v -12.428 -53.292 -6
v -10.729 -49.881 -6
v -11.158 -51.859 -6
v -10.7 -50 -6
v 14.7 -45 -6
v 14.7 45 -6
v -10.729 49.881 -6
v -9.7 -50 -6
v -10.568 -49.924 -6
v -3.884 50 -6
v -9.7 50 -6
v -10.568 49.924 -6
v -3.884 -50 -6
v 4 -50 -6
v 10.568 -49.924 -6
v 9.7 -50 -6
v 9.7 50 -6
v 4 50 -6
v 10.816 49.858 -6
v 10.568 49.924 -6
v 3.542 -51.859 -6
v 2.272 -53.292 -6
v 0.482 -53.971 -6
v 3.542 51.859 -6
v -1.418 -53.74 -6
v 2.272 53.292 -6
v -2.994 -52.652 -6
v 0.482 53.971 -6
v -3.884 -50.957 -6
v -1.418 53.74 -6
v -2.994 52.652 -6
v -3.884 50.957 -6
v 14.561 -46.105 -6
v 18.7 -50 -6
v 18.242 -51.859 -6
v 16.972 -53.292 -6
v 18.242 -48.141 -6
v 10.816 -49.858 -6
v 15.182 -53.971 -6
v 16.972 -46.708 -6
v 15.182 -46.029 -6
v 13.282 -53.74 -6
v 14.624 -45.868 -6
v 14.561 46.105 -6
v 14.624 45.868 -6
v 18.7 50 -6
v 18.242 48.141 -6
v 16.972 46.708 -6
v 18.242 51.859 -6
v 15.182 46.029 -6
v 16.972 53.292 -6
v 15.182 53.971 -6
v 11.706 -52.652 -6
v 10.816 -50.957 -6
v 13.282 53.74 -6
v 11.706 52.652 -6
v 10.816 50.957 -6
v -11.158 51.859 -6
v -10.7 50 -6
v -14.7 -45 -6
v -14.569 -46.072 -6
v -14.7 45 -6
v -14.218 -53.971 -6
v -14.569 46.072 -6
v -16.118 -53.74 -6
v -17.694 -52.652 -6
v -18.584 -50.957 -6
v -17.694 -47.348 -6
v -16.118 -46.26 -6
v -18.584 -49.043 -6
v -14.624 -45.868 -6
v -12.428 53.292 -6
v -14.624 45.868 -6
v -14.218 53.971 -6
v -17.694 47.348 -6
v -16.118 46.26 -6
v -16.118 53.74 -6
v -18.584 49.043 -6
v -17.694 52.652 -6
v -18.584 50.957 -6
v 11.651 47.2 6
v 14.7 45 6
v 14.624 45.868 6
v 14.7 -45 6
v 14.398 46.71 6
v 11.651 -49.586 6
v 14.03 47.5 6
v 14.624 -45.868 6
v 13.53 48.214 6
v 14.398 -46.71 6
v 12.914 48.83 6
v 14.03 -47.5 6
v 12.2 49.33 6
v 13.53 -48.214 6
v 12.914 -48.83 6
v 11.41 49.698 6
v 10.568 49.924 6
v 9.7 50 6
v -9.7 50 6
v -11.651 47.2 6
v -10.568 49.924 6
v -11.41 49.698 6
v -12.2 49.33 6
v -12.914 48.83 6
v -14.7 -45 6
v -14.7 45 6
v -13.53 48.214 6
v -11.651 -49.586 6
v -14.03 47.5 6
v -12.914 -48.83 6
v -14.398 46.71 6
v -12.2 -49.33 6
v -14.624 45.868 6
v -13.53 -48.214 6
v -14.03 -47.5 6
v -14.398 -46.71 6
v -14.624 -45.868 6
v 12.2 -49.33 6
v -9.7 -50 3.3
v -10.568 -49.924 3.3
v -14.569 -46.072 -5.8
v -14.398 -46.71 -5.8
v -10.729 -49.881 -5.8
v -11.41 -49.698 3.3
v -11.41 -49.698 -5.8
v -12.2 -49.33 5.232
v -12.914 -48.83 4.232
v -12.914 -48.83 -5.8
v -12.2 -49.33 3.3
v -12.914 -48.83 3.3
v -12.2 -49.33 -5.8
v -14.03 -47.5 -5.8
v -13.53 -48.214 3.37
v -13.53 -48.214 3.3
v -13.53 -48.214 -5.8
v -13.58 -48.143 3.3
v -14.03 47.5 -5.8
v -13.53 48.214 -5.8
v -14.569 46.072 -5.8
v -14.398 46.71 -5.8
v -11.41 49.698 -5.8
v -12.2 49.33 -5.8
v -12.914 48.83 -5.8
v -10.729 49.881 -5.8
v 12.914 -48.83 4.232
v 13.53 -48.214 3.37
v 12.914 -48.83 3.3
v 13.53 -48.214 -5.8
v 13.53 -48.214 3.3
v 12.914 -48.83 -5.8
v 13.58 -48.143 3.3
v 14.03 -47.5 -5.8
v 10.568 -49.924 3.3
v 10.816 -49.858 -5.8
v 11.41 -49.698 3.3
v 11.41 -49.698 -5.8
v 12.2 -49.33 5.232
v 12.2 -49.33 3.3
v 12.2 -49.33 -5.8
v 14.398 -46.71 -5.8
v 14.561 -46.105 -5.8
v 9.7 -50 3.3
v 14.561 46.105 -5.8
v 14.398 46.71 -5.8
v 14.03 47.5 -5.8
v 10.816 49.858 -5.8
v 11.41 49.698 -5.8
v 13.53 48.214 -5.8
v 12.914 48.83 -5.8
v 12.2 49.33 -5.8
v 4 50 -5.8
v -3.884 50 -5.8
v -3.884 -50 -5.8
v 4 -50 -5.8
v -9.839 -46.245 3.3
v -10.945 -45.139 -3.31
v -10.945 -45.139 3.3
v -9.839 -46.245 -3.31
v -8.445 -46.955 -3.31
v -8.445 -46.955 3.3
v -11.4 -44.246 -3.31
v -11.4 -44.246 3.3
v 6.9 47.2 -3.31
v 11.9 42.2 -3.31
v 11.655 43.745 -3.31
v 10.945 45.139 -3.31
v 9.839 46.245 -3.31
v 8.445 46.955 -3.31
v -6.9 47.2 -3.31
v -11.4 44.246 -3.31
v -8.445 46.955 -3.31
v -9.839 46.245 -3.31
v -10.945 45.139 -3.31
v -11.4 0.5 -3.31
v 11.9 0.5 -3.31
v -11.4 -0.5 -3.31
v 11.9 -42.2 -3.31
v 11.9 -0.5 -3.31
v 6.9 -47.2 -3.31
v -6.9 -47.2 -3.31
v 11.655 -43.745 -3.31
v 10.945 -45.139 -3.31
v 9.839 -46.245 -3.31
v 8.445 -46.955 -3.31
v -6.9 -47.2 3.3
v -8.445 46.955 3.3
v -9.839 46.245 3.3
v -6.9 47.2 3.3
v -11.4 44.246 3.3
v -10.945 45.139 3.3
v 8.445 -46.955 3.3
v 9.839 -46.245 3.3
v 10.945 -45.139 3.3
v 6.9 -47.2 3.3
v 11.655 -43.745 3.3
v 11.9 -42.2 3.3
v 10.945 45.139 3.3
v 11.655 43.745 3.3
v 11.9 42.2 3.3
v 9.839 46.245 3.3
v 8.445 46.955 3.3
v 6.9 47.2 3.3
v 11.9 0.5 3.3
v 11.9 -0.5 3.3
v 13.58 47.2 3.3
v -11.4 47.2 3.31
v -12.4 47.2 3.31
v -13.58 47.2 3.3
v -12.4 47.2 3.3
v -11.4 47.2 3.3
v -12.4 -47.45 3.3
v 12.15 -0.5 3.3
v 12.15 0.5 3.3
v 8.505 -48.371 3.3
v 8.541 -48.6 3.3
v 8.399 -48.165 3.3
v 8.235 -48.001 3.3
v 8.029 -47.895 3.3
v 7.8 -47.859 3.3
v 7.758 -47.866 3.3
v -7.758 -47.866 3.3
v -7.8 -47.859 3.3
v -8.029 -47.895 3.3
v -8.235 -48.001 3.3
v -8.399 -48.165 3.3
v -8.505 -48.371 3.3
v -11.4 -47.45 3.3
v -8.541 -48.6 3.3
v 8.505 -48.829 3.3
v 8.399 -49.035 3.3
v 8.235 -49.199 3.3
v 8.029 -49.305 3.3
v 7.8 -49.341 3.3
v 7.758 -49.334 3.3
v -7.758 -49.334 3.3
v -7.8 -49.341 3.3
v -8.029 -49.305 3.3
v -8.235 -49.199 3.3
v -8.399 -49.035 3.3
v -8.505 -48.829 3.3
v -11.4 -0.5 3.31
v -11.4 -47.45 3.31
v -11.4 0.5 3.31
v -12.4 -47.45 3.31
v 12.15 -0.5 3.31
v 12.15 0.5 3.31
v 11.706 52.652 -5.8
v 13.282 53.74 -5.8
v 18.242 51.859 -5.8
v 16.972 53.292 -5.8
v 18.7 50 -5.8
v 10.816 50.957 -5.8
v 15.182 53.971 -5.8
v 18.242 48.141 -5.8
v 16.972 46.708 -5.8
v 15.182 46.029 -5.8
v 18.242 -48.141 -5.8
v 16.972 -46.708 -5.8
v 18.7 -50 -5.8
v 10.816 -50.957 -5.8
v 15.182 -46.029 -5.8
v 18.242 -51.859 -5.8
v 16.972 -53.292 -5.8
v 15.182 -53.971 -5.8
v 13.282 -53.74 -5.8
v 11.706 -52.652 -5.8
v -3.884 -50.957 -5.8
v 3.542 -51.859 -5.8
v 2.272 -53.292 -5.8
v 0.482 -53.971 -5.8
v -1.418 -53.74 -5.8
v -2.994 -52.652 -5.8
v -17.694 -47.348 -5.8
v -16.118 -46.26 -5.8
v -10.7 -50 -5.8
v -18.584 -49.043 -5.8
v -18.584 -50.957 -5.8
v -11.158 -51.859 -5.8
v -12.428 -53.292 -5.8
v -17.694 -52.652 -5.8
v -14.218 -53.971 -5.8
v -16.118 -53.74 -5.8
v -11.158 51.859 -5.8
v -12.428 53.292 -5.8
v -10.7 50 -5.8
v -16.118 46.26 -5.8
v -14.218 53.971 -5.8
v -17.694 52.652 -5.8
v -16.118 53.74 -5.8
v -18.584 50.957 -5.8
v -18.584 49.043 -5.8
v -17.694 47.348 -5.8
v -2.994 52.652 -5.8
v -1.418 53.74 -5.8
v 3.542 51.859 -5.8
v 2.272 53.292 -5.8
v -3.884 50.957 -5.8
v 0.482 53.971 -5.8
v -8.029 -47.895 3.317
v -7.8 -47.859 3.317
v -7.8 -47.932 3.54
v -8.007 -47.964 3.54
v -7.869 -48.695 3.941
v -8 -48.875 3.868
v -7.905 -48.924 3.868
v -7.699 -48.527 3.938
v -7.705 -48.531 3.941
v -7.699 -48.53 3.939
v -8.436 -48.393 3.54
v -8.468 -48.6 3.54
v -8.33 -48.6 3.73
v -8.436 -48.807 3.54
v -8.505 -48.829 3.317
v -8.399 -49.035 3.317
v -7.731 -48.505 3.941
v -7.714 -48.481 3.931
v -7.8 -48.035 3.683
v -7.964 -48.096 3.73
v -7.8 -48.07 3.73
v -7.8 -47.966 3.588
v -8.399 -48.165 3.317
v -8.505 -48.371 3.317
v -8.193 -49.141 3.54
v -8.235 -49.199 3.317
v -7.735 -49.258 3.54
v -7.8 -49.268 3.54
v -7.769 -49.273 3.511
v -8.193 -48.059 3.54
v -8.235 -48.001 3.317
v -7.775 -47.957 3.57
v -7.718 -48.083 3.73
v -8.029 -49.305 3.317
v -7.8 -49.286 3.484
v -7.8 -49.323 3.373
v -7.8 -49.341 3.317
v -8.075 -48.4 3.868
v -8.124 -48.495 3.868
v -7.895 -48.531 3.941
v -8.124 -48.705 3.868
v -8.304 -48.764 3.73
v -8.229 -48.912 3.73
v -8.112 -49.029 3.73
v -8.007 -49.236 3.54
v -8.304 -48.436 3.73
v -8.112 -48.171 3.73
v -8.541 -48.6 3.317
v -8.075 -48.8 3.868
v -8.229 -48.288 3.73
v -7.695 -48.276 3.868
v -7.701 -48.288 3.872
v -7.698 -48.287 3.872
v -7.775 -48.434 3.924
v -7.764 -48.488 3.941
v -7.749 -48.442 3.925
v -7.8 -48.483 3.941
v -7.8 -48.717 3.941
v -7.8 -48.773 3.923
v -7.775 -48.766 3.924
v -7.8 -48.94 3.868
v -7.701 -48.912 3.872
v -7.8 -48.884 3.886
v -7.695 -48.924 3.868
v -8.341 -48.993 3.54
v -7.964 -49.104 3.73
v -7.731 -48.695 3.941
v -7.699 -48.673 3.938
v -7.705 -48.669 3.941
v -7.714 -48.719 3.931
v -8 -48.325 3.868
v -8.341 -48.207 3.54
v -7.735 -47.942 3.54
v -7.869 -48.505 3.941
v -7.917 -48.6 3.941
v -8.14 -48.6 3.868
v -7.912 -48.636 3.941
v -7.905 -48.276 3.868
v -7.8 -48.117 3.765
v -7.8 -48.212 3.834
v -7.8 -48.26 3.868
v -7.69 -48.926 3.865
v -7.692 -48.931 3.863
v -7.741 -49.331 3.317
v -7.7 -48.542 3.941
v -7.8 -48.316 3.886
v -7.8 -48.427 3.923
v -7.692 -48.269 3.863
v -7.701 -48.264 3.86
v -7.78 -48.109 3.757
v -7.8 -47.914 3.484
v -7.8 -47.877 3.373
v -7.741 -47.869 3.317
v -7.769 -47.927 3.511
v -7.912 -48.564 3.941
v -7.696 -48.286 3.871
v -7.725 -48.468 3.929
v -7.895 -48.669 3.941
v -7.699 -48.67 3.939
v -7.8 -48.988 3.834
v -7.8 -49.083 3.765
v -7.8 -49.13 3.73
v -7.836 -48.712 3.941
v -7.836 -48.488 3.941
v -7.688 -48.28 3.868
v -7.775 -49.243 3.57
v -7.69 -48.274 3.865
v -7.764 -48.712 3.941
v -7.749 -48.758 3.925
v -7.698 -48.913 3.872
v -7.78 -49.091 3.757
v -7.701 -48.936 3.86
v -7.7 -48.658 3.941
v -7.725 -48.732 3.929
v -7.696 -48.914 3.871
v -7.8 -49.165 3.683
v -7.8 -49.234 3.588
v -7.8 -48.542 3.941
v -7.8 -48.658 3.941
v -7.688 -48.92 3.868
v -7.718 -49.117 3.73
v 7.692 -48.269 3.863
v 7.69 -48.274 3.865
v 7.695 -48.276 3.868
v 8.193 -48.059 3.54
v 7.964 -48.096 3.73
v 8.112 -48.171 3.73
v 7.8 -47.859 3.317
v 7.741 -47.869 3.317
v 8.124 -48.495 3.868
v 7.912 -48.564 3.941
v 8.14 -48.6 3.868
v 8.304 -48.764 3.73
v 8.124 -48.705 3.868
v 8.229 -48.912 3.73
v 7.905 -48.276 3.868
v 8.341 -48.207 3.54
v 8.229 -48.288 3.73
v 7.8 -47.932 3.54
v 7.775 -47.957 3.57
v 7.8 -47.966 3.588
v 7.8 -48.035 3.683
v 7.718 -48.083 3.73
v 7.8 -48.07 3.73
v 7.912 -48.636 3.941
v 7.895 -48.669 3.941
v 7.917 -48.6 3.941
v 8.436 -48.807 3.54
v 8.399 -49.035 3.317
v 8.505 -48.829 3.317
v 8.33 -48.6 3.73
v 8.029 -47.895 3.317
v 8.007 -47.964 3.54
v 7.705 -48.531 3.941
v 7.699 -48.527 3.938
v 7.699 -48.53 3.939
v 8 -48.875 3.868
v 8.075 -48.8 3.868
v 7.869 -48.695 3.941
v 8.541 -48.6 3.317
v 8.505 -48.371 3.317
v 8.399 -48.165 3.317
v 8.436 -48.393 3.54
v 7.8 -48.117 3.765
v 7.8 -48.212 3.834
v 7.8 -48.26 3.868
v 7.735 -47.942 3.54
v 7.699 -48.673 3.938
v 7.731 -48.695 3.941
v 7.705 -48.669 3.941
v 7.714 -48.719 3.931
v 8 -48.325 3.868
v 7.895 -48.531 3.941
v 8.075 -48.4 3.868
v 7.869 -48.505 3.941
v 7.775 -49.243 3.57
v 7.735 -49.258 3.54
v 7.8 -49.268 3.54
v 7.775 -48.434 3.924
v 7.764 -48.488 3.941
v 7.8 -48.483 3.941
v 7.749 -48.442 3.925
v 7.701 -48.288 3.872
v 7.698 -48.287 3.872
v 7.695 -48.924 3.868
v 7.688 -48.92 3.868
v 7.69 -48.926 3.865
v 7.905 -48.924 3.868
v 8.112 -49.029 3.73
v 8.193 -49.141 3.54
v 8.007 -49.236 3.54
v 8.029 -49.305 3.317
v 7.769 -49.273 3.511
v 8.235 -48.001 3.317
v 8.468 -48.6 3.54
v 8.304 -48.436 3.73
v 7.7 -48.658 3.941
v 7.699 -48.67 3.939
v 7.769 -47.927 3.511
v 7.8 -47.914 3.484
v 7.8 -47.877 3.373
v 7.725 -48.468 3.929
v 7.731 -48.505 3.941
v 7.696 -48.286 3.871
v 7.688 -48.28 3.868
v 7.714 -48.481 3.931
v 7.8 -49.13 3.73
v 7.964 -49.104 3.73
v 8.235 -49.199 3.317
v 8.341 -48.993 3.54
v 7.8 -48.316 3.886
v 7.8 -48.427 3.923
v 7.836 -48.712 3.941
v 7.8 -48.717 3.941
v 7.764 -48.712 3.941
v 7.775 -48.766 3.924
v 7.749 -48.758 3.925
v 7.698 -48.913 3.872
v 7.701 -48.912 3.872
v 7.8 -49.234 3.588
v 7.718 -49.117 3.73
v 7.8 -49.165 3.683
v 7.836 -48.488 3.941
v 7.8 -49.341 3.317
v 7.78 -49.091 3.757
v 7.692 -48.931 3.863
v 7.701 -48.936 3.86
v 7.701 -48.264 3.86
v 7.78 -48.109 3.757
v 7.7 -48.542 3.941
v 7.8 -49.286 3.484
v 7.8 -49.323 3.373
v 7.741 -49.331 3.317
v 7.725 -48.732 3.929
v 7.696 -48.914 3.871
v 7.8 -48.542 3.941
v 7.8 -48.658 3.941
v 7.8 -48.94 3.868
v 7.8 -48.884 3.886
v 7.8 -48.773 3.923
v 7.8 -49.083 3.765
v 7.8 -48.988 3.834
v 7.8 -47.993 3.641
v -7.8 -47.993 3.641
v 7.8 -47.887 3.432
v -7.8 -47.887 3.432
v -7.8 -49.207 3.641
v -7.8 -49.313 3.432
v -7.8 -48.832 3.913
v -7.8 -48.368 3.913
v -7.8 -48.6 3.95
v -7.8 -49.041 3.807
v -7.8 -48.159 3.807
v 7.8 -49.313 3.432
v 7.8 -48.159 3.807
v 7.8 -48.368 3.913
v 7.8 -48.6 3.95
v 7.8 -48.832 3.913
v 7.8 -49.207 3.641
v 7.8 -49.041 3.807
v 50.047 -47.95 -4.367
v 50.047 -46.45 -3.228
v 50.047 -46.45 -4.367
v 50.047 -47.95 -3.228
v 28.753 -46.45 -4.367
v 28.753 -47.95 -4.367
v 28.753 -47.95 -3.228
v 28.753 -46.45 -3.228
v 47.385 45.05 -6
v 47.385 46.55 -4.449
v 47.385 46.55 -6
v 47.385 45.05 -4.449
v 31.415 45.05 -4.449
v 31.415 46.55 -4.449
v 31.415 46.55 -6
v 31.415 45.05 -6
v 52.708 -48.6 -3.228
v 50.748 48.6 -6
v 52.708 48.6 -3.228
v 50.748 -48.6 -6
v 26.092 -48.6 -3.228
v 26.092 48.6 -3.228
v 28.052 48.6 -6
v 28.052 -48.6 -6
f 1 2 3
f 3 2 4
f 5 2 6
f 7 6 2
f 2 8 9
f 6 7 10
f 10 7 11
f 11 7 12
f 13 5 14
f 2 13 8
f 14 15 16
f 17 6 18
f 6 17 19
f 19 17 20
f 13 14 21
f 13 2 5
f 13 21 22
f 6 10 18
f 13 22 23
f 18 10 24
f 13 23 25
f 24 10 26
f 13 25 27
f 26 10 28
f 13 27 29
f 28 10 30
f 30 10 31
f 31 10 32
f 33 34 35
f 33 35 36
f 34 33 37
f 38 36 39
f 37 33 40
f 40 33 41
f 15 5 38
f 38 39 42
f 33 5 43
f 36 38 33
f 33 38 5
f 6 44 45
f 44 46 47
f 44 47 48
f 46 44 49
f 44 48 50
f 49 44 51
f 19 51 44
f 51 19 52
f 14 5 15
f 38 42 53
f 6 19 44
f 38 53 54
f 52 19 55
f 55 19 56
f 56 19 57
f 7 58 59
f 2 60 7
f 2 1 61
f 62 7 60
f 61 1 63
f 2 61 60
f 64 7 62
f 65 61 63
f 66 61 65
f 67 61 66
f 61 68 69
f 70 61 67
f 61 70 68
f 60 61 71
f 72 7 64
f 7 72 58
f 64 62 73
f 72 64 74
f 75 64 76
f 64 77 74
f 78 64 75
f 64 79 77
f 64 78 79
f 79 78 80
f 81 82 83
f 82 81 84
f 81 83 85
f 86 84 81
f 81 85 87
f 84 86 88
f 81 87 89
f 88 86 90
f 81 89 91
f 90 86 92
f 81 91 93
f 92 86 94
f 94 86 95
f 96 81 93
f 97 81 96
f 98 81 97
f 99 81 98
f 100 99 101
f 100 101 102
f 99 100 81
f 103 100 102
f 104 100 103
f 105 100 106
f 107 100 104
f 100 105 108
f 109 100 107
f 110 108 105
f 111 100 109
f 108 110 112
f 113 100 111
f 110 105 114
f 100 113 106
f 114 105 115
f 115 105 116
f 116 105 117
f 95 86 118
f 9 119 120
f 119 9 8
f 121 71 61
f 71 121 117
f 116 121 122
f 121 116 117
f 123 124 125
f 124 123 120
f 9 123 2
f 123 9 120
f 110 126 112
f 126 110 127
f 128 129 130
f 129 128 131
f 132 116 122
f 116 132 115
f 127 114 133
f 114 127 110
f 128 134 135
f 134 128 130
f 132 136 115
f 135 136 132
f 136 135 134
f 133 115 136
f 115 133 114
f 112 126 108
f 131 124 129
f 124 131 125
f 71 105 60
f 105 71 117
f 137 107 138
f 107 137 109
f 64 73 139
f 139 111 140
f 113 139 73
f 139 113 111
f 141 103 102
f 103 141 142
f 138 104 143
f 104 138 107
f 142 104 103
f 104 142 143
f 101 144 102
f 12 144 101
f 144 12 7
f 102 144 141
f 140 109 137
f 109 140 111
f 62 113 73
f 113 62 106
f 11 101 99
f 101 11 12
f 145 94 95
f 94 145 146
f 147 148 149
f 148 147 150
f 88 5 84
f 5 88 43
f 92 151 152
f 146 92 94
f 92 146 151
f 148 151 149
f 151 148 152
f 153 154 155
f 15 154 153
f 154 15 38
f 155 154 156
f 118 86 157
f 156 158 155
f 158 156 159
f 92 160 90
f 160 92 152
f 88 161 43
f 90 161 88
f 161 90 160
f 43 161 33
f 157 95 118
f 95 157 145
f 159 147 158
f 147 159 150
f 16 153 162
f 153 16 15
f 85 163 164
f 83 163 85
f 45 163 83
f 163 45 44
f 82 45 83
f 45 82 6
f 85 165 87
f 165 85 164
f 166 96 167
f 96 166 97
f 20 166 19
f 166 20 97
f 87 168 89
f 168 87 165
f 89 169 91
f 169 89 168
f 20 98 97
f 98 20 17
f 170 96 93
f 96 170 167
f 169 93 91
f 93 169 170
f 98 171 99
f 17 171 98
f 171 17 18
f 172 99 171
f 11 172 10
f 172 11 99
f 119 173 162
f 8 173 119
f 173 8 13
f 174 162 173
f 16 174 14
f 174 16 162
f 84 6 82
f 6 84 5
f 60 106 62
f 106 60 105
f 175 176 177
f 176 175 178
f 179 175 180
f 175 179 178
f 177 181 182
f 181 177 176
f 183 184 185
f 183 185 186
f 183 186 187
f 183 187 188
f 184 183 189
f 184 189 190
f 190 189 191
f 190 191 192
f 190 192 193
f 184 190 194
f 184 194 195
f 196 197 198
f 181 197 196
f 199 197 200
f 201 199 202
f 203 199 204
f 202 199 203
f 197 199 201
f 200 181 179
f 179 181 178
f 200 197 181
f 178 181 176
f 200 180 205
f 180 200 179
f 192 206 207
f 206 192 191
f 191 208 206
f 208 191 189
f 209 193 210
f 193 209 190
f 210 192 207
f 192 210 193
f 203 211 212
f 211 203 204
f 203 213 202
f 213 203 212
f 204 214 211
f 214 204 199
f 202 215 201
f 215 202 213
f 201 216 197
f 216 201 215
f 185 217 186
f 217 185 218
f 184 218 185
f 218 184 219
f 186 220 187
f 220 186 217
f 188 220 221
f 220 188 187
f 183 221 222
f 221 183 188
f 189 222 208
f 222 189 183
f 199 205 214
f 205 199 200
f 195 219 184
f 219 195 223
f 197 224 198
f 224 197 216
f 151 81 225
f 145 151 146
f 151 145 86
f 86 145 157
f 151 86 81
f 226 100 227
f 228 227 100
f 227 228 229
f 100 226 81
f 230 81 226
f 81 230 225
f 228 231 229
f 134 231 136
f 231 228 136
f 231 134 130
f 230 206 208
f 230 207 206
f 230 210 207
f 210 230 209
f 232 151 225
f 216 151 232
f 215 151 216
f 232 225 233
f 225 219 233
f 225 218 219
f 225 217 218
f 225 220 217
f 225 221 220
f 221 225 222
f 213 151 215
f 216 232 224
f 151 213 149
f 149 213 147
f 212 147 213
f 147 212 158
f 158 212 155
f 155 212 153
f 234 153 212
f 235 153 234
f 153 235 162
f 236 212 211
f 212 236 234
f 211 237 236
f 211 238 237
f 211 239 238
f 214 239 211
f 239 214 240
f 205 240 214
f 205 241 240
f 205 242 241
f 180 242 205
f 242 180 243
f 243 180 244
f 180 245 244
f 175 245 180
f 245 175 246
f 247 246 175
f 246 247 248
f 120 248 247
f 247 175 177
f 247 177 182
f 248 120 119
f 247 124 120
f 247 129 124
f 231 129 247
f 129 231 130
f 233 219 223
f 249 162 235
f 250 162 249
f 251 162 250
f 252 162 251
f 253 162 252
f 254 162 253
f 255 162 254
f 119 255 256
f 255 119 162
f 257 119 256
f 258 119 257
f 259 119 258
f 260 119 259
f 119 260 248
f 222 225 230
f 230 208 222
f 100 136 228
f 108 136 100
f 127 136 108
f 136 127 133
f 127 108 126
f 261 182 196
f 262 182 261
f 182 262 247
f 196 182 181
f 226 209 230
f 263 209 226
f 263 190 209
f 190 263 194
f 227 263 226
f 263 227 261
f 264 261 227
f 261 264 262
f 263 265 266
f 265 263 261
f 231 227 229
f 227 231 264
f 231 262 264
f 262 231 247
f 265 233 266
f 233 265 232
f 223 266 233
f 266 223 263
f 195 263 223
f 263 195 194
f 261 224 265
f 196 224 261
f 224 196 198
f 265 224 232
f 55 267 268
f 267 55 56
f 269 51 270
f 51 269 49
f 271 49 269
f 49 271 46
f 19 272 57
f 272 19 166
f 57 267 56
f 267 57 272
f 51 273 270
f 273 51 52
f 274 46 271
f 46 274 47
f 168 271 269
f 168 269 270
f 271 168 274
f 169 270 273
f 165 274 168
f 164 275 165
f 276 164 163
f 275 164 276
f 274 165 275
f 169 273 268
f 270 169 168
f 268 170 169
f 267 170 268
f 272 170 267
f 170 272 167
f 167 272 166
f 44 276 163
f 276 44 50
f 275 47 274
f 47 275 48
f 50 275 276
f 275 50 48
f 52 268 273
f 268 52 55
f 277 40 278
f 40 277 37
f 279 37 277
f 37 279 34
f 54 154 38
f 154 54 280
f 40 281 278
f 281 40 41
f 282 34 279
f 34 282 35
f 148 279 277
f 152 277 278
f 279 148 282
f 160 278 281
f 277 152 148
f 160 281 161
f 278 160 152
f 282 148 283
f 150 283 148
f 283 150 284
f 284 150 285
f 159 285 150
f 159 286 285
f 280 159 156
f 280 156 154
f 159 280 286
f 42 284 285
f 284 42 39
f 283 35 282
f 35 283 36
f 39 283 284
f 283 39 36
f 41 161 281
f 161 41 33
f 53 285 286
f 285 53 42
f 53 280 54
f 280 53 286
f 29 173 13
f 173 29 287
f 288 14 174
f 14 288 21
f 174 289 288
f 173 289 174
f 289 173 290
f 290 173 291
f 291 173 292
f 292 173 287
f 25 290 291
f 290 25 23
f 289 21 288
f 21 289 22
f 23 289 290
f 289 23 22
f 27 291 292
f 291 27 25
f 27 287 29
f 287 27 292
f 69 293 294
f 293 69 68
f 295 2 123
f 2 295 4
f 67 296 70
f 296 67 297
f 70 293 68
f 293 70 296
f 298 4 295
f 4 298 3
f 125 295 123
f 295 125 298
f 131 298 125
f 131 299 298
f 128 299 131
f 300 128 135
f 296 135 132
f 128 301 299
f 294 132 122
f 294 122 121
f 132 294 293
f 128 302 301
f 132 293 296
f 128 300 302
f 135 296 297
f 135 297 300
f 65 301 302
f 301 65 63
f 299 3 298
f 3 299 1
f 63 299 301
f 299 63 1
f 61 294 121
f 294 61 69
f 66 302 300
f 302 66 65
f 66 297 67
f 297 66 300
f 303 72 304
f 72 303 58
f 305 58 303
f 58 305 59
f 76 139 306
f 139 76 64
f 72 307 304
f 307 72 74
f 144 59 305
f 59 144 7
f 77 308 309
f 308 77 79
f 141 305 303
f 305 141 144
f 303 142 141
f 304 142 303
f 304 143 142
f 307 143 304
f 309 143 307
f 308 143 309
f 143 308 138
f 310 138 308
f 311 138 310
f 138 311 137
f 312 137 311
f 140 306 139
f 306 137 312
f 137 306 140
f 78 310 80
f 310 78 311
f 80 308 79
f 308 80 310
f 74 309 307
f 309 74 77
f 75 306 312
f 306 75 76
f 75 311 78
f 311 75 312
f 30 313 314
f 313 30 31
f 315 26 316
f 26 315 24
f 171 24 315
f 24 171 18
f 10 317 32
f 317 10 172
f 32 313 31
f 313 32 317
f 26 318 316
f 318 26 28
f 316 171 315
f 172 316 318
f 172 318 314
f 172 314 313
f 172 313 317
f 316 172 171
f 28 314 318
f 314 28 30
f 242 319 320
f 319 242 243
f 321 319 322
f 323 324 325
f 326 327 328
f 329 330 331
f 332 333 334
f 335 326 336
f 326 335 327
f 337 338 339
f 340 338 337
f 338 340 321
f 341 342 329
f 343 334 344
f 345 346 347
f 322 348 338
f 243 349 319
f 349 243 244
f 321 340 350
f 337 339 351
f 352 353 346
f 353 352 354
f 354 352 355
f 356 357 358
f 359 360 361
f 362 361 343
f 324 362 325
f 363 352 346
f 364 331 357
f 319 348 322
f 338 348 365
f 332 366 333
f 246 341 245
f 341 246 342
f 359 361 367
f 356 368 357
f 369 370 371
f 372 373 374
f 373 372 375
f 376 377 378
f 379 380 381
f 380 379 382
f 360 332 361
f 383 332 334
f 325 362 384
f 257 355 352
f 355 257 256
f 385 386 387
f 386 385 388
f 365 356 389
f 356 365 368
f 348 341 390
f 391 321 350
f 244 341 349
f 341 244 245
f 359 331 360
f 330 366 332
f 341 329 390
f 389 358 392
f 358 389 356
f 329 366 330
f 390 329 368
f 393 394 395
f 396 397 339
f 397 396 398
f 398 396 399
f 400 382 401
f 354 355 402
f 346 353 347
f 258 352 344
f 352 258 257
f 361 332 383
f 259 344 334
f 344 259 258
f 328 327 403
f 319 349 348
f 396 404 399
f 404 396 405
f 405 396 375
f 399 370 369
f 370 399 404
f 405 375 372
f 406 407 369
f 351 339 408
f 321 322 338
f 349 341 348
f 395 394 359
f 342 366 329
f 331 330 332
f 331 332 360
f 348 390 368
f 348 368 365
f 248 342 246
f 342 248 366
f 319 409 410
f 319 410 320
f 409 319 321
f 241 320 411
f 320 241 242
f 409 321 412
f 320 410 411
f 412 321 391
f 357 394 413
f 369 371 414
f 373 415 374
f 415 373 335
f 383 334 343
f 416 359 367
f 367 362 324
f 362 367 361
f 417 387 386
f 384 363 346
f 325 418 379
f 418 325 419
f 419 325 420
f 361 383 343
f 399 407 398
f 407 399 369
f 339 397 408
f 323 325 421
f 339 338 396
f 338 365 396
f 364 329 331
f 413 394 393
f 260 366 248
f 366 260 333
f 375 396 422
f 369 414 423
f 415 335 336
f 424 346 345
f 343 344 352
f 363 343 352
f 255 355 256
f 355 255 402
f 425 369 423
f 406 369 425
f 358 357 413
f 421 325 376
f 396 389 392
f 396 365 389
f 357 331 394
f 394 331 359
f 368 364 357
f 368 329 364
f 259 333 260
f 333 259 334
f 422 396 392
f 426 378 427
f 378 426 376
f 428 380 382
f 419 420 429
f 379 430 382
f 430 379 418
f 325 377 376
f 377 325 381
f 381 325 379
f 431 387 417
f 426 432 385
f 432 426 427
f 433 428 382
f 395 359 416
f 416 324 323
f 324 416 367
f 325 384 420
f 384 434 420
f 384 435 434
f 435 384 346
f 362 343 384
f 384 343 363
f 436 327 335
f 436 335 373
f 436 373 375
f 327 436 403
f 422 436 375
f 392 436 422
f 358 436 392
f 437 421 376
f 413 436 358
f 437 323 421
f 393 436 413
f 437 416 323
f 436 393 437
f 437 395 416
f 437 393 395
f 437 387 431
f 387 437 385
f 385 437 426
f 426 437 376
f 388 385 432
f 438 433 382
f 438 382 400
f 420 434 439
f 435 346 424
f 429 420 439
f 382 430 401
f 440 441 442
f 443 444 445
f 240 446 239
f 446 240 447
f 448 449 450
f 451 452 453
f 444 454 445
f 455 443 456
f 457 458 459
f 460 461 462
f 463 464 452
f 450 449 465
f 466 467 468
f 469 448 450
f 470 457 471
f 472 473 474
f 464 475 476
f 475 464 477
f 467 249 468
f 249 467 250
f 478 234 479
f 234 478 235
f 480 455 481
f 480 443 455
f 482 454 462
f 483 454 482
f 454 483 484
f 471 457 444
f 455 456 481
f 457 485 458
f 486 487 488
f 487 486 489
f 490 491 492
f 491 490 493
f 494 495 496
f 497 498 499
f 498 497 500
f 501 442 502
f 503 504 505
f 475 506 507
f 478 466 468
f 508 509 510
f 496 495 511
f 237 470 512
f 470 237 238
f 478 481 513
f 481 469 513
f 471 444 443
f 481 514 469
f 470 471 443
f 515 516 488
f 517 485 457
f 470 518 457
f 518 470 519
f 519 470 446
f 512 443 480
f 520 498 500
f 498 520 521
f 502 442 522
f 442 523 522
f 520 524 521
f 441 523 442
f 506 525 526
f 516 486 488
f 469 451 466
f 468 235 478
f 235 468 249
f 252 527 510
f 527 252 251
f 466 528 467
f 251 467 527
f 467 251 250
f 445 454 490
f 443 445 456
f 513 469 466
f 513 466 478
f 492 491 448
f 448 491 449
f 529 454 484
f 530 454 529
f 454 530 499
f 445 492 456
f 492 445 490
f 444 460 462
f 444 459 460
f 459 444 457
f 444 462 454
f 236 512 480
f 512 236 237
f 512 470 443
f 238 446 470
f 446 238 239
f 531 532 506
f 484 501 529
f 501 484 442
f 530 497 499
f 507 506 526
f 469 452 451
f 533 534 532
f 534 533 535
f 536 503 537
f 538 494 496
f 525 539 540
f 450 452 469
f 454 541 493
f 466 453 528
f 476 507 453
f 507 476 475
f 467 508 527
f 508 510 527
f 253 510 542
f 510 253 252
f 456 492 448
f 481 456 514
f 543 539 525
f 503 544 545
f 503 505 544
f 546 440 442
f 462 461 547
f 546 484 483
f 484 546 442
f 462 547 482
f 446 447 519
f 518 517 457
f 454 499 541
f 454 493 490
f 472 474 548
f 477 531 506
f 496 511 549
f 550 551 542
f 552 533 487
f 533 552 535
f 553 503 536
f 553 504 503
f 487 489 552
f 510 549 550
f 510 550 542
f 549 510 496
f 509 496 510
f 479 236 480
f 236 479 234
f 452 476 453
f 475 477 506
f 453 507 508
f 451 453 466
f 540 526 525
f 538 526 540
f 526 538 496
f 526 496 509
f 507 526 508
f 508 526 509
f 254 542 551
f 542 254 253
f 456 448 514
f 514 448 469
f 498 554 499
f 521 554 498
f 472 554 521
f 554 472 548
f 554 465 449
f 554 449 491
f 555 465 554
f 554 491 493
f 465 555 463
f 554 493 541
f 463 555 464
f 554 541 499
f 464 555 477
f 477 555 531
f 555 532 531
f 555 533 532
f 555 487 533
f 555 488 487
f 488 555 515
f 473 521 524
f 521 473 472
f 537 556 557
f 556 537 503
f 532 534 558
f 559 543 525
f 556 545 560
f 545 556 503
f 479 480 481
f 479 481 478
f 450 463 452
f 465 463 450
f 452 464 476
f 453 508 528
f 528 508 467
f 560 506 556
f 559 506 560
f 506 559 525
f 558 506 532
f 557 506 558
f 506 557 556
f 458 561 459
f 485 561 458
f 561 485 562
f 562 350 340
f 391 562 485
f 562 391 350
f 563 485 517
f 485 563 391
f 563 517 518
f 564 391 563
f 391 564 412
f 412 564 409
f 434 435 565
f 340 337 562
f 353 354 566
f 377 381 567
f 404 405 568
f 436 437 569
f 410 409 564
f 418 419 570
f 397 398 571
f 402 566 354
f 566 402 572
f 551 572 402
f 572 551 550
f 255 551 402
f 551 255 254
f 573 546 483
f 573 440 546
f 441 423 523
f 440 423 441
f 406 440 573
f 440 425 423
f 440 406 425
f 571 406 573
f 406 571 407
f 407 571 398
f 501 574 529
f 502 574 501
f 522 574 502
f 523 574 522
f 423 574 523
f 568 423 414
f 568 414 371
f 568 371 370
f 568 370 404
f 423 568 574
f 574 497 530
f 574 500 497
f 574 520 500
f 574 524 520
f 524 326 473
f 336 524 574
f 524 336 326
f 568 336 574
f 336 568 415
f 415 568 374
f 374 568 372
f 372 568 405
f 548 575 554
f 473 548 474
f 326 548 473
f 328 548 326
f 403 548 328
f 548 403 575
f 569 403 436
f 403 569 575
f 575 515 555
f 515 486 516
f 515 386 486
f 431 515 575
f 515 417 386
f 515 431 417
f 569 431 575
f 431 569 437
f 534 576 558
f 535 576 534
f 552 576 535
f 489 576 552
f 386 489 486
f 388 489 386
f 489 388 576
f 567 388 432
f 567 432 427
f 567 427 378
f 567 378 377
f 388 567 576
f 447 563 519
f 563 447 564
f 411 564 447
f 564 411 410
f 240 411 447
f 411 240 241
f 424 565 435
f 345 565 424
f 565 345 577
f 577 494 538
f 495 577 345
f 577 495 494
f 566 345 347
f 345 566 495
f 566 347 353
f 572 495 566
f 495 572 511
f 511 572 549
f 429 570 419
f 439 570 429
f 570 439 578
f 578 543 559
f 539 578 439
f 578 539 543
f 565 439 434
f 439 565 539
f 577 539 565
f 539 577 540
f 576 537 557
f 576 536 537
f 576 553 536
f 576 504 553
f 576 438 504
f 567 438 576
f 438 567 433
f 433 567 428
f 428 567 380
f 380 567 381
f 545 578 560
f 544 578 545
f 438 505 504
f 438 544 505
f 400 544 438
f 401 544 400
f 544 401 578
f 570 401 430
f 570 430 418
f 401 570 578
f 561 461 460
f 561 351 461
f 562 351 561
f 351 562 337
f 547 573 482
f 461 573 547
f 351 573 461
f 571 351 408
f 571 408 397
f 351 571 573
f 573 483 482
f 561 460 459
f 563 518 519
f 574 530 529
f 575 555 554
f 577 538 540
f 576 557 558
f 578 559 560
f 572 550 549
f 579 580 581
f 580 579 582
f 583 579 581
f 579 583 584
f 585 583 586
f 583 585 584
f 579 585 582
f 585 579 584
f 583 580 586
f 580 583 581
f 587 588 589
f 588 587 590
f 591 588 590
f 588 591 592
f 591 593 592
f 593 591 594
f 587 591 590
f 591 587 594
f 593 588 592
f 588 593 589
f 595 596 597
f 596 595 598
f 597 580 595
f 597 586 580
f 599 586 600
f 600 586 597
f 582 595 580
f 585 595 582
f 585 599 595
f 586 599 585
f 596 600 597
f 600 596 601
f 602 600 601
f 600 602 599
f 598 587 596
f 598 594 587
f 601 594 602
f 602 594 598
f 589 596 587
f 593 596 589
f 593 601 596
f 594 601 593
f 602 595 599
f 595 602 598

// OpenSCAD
include <MCAD/boxes.scad>
/* 

Potential Revisions
- rework for internal volume rather than external volume

*/


//Pill box with sliding lid


/* [Outside Box Dimensions] */
//Box Width (min: 5 x Wall Thickness)
//Excedrin
//bX=24; 
bX=29.4;
//Box Depth (min: 5 x Wall Thickness)
//Excedrin
//bY=42; 
bY=100;
//Box Height (min: 5 x Wall Thickness)
bZ=12;
//Corner Radius (radius of the corner fillet inside and outside)
corner=5; 
//Wall Thickness (min: 2mm)
wall=2.8;
//Ears Radius (add ears to help improve adhesion)
ear_rad=4;

/* [Inside] */
//X columns (0 for no dividers)
col=0; 
//Y rows (0 for no dividers)
row=2; 
//Divider Wall Thickness
divWall=1;

/* [Lid] */
//Lid Lip Width (min: 1mm)
lip=2;
//Snugness of Lid (values approaching 1.0 result in a snugger fit)
snug=.99; 

/* [Catch] */
//Catch Height (height over the lip for the catch)
catch=1.5;

/* [Hidden] */
boxDim=[bX, bY, bZ]; 
over=.5; //amount to extend parts that need to have interference (such as dividers)
module xDiv(inSide){
  xInc=inSide[0]/col;
  for ( i = [1 : col-1] ) {
    translate([i*xInc, 0, 0])cube([divWall, inSide[1]+over, inSide[2]+over], center=true);
  }
}

module ear(rad, height) {
  cylinder(h=height, r=rad, center=true);
}


module yDiv(inSide){
  yInc=inSide[1]/row;
  for (i = [1 : row-1] ) {
    translate([0, i*yInc, 0])cube([inSide[0]+over, divWall, inSide[2]+over], center=true);
  }
}

module drawBox () {
  innerBox=[bX-(2*wall), bY-(2*wall), bZ-(2*wall)+.22];
  echo("innerBox=", innerBox);
  union() {
    difference() {
      roundedBox(boxDim, corner, sidesonly=1, $fn=36);
      roundedBox(innerBox, corner, sidesonly=1, $fn=20);
      translate([0, -wall, bZ/2+.1]) cutLid(0);
    }
    translate([-innerBox[0]/2, 0, -over/2]) xDiv(innerBox);
    translate([0, -innerBox[1]/2, -over/2]) yDiv(innerBox);
  }
}

module cutLid(shorten, catch) {
  //Create a trapezoid lid 

  insideLip=wall*1.2; //lip inside the box for the lid to rest upon
  lX=bX-(2*wall)+insideLip;
  lY=bY-shorten;

  echo("inside lip=", insideLip/2);

  //polygon points
  p0=[0, 0];
  p1=[lX, 0];
  p2=[lX-lip, wall];
  p3=[lip, wall];

  // this needs to be less than 45 deg to be usable
  echo("Lip Overhang (degrees)=", atan(lip/wall));
  
  difference() {
    rotate([90,0,0])
      translate([-lX/2, -wall, 0]) 
      linear_extrude(height=lY, center=true) polygon([p0, p1, p2, p3], paths=[[0,1,2,3]]);
    if (catch==1) {
      translate([0, lY/2-wall/2, -wall+catch/2]) cube([lX*.8, catch*1.5, catch*1.3], center=true);
      //Add an additional slot to make it easier to slide open the lid
      translate([0, -lY/2+wall, wall/3]) cube([lX*.6, catch*1.5, catch*5], center=true);
    } else {
      echo("catch=false");
    }

  }
}

module drawCatch() {
  rad=catch/2;
  lX=bX-2*(wall+.2);

  union() {
    translate([-lX/3, 0, 0]) sphere(r=rad, $fn=20);
    translate([ lX/3, 0, 0]) sphere(r=rad, $fn=20);
    rotate([0,90,0])cylinder(h=lX/1.5, r=rad, center=true, $fn=20);
  }
}


module add_ears() {
  thick=.2;
  // absolute coordinate values
  cbX=bX/2;
  cbY=bY/2;
  cbZ=-bZ/2+thick/2; //always negative

  eA=[ cbX,  cbY, cbZ];
  eB=[ cbX, -cbY, cbZ];
  eB2=[  0, -cbY, cbZ];
  eC=[-cbX, -cbY, cbZ];
  eD=[-cbX,  cbY, cbZ];
  eD2=[  0,  cbY, cbZ];
  translate(eA) ear(ear_rad, thick); 
  translate(eB) ear(ear_rad, thick);
  translate(eB2) ear(ear_rad, thick);
  translate(eC) ear(ear_rad, thick);
  translate(eD) ear(ear_rad, thick);
  translate(eD2) ear(ear_rad, thick);
}


module assemble() {
  //Draw box
  union() {
    drawBox();
    add_ears();
    //move the catch to the front of the box
    translate([0, -(bY/2)+wall/2, bZ/2-wall]) drawCatch();
  }
  
  //draw the lid (wall, 1) - second paramater specifies to add a hole for a catch
  translate([bX+10, 0, (-bZ/2)]) rotate([180, 0, 0]) scale([snug-.01, 1, snug]) cutLid(wall, 1);
}

assemble();
